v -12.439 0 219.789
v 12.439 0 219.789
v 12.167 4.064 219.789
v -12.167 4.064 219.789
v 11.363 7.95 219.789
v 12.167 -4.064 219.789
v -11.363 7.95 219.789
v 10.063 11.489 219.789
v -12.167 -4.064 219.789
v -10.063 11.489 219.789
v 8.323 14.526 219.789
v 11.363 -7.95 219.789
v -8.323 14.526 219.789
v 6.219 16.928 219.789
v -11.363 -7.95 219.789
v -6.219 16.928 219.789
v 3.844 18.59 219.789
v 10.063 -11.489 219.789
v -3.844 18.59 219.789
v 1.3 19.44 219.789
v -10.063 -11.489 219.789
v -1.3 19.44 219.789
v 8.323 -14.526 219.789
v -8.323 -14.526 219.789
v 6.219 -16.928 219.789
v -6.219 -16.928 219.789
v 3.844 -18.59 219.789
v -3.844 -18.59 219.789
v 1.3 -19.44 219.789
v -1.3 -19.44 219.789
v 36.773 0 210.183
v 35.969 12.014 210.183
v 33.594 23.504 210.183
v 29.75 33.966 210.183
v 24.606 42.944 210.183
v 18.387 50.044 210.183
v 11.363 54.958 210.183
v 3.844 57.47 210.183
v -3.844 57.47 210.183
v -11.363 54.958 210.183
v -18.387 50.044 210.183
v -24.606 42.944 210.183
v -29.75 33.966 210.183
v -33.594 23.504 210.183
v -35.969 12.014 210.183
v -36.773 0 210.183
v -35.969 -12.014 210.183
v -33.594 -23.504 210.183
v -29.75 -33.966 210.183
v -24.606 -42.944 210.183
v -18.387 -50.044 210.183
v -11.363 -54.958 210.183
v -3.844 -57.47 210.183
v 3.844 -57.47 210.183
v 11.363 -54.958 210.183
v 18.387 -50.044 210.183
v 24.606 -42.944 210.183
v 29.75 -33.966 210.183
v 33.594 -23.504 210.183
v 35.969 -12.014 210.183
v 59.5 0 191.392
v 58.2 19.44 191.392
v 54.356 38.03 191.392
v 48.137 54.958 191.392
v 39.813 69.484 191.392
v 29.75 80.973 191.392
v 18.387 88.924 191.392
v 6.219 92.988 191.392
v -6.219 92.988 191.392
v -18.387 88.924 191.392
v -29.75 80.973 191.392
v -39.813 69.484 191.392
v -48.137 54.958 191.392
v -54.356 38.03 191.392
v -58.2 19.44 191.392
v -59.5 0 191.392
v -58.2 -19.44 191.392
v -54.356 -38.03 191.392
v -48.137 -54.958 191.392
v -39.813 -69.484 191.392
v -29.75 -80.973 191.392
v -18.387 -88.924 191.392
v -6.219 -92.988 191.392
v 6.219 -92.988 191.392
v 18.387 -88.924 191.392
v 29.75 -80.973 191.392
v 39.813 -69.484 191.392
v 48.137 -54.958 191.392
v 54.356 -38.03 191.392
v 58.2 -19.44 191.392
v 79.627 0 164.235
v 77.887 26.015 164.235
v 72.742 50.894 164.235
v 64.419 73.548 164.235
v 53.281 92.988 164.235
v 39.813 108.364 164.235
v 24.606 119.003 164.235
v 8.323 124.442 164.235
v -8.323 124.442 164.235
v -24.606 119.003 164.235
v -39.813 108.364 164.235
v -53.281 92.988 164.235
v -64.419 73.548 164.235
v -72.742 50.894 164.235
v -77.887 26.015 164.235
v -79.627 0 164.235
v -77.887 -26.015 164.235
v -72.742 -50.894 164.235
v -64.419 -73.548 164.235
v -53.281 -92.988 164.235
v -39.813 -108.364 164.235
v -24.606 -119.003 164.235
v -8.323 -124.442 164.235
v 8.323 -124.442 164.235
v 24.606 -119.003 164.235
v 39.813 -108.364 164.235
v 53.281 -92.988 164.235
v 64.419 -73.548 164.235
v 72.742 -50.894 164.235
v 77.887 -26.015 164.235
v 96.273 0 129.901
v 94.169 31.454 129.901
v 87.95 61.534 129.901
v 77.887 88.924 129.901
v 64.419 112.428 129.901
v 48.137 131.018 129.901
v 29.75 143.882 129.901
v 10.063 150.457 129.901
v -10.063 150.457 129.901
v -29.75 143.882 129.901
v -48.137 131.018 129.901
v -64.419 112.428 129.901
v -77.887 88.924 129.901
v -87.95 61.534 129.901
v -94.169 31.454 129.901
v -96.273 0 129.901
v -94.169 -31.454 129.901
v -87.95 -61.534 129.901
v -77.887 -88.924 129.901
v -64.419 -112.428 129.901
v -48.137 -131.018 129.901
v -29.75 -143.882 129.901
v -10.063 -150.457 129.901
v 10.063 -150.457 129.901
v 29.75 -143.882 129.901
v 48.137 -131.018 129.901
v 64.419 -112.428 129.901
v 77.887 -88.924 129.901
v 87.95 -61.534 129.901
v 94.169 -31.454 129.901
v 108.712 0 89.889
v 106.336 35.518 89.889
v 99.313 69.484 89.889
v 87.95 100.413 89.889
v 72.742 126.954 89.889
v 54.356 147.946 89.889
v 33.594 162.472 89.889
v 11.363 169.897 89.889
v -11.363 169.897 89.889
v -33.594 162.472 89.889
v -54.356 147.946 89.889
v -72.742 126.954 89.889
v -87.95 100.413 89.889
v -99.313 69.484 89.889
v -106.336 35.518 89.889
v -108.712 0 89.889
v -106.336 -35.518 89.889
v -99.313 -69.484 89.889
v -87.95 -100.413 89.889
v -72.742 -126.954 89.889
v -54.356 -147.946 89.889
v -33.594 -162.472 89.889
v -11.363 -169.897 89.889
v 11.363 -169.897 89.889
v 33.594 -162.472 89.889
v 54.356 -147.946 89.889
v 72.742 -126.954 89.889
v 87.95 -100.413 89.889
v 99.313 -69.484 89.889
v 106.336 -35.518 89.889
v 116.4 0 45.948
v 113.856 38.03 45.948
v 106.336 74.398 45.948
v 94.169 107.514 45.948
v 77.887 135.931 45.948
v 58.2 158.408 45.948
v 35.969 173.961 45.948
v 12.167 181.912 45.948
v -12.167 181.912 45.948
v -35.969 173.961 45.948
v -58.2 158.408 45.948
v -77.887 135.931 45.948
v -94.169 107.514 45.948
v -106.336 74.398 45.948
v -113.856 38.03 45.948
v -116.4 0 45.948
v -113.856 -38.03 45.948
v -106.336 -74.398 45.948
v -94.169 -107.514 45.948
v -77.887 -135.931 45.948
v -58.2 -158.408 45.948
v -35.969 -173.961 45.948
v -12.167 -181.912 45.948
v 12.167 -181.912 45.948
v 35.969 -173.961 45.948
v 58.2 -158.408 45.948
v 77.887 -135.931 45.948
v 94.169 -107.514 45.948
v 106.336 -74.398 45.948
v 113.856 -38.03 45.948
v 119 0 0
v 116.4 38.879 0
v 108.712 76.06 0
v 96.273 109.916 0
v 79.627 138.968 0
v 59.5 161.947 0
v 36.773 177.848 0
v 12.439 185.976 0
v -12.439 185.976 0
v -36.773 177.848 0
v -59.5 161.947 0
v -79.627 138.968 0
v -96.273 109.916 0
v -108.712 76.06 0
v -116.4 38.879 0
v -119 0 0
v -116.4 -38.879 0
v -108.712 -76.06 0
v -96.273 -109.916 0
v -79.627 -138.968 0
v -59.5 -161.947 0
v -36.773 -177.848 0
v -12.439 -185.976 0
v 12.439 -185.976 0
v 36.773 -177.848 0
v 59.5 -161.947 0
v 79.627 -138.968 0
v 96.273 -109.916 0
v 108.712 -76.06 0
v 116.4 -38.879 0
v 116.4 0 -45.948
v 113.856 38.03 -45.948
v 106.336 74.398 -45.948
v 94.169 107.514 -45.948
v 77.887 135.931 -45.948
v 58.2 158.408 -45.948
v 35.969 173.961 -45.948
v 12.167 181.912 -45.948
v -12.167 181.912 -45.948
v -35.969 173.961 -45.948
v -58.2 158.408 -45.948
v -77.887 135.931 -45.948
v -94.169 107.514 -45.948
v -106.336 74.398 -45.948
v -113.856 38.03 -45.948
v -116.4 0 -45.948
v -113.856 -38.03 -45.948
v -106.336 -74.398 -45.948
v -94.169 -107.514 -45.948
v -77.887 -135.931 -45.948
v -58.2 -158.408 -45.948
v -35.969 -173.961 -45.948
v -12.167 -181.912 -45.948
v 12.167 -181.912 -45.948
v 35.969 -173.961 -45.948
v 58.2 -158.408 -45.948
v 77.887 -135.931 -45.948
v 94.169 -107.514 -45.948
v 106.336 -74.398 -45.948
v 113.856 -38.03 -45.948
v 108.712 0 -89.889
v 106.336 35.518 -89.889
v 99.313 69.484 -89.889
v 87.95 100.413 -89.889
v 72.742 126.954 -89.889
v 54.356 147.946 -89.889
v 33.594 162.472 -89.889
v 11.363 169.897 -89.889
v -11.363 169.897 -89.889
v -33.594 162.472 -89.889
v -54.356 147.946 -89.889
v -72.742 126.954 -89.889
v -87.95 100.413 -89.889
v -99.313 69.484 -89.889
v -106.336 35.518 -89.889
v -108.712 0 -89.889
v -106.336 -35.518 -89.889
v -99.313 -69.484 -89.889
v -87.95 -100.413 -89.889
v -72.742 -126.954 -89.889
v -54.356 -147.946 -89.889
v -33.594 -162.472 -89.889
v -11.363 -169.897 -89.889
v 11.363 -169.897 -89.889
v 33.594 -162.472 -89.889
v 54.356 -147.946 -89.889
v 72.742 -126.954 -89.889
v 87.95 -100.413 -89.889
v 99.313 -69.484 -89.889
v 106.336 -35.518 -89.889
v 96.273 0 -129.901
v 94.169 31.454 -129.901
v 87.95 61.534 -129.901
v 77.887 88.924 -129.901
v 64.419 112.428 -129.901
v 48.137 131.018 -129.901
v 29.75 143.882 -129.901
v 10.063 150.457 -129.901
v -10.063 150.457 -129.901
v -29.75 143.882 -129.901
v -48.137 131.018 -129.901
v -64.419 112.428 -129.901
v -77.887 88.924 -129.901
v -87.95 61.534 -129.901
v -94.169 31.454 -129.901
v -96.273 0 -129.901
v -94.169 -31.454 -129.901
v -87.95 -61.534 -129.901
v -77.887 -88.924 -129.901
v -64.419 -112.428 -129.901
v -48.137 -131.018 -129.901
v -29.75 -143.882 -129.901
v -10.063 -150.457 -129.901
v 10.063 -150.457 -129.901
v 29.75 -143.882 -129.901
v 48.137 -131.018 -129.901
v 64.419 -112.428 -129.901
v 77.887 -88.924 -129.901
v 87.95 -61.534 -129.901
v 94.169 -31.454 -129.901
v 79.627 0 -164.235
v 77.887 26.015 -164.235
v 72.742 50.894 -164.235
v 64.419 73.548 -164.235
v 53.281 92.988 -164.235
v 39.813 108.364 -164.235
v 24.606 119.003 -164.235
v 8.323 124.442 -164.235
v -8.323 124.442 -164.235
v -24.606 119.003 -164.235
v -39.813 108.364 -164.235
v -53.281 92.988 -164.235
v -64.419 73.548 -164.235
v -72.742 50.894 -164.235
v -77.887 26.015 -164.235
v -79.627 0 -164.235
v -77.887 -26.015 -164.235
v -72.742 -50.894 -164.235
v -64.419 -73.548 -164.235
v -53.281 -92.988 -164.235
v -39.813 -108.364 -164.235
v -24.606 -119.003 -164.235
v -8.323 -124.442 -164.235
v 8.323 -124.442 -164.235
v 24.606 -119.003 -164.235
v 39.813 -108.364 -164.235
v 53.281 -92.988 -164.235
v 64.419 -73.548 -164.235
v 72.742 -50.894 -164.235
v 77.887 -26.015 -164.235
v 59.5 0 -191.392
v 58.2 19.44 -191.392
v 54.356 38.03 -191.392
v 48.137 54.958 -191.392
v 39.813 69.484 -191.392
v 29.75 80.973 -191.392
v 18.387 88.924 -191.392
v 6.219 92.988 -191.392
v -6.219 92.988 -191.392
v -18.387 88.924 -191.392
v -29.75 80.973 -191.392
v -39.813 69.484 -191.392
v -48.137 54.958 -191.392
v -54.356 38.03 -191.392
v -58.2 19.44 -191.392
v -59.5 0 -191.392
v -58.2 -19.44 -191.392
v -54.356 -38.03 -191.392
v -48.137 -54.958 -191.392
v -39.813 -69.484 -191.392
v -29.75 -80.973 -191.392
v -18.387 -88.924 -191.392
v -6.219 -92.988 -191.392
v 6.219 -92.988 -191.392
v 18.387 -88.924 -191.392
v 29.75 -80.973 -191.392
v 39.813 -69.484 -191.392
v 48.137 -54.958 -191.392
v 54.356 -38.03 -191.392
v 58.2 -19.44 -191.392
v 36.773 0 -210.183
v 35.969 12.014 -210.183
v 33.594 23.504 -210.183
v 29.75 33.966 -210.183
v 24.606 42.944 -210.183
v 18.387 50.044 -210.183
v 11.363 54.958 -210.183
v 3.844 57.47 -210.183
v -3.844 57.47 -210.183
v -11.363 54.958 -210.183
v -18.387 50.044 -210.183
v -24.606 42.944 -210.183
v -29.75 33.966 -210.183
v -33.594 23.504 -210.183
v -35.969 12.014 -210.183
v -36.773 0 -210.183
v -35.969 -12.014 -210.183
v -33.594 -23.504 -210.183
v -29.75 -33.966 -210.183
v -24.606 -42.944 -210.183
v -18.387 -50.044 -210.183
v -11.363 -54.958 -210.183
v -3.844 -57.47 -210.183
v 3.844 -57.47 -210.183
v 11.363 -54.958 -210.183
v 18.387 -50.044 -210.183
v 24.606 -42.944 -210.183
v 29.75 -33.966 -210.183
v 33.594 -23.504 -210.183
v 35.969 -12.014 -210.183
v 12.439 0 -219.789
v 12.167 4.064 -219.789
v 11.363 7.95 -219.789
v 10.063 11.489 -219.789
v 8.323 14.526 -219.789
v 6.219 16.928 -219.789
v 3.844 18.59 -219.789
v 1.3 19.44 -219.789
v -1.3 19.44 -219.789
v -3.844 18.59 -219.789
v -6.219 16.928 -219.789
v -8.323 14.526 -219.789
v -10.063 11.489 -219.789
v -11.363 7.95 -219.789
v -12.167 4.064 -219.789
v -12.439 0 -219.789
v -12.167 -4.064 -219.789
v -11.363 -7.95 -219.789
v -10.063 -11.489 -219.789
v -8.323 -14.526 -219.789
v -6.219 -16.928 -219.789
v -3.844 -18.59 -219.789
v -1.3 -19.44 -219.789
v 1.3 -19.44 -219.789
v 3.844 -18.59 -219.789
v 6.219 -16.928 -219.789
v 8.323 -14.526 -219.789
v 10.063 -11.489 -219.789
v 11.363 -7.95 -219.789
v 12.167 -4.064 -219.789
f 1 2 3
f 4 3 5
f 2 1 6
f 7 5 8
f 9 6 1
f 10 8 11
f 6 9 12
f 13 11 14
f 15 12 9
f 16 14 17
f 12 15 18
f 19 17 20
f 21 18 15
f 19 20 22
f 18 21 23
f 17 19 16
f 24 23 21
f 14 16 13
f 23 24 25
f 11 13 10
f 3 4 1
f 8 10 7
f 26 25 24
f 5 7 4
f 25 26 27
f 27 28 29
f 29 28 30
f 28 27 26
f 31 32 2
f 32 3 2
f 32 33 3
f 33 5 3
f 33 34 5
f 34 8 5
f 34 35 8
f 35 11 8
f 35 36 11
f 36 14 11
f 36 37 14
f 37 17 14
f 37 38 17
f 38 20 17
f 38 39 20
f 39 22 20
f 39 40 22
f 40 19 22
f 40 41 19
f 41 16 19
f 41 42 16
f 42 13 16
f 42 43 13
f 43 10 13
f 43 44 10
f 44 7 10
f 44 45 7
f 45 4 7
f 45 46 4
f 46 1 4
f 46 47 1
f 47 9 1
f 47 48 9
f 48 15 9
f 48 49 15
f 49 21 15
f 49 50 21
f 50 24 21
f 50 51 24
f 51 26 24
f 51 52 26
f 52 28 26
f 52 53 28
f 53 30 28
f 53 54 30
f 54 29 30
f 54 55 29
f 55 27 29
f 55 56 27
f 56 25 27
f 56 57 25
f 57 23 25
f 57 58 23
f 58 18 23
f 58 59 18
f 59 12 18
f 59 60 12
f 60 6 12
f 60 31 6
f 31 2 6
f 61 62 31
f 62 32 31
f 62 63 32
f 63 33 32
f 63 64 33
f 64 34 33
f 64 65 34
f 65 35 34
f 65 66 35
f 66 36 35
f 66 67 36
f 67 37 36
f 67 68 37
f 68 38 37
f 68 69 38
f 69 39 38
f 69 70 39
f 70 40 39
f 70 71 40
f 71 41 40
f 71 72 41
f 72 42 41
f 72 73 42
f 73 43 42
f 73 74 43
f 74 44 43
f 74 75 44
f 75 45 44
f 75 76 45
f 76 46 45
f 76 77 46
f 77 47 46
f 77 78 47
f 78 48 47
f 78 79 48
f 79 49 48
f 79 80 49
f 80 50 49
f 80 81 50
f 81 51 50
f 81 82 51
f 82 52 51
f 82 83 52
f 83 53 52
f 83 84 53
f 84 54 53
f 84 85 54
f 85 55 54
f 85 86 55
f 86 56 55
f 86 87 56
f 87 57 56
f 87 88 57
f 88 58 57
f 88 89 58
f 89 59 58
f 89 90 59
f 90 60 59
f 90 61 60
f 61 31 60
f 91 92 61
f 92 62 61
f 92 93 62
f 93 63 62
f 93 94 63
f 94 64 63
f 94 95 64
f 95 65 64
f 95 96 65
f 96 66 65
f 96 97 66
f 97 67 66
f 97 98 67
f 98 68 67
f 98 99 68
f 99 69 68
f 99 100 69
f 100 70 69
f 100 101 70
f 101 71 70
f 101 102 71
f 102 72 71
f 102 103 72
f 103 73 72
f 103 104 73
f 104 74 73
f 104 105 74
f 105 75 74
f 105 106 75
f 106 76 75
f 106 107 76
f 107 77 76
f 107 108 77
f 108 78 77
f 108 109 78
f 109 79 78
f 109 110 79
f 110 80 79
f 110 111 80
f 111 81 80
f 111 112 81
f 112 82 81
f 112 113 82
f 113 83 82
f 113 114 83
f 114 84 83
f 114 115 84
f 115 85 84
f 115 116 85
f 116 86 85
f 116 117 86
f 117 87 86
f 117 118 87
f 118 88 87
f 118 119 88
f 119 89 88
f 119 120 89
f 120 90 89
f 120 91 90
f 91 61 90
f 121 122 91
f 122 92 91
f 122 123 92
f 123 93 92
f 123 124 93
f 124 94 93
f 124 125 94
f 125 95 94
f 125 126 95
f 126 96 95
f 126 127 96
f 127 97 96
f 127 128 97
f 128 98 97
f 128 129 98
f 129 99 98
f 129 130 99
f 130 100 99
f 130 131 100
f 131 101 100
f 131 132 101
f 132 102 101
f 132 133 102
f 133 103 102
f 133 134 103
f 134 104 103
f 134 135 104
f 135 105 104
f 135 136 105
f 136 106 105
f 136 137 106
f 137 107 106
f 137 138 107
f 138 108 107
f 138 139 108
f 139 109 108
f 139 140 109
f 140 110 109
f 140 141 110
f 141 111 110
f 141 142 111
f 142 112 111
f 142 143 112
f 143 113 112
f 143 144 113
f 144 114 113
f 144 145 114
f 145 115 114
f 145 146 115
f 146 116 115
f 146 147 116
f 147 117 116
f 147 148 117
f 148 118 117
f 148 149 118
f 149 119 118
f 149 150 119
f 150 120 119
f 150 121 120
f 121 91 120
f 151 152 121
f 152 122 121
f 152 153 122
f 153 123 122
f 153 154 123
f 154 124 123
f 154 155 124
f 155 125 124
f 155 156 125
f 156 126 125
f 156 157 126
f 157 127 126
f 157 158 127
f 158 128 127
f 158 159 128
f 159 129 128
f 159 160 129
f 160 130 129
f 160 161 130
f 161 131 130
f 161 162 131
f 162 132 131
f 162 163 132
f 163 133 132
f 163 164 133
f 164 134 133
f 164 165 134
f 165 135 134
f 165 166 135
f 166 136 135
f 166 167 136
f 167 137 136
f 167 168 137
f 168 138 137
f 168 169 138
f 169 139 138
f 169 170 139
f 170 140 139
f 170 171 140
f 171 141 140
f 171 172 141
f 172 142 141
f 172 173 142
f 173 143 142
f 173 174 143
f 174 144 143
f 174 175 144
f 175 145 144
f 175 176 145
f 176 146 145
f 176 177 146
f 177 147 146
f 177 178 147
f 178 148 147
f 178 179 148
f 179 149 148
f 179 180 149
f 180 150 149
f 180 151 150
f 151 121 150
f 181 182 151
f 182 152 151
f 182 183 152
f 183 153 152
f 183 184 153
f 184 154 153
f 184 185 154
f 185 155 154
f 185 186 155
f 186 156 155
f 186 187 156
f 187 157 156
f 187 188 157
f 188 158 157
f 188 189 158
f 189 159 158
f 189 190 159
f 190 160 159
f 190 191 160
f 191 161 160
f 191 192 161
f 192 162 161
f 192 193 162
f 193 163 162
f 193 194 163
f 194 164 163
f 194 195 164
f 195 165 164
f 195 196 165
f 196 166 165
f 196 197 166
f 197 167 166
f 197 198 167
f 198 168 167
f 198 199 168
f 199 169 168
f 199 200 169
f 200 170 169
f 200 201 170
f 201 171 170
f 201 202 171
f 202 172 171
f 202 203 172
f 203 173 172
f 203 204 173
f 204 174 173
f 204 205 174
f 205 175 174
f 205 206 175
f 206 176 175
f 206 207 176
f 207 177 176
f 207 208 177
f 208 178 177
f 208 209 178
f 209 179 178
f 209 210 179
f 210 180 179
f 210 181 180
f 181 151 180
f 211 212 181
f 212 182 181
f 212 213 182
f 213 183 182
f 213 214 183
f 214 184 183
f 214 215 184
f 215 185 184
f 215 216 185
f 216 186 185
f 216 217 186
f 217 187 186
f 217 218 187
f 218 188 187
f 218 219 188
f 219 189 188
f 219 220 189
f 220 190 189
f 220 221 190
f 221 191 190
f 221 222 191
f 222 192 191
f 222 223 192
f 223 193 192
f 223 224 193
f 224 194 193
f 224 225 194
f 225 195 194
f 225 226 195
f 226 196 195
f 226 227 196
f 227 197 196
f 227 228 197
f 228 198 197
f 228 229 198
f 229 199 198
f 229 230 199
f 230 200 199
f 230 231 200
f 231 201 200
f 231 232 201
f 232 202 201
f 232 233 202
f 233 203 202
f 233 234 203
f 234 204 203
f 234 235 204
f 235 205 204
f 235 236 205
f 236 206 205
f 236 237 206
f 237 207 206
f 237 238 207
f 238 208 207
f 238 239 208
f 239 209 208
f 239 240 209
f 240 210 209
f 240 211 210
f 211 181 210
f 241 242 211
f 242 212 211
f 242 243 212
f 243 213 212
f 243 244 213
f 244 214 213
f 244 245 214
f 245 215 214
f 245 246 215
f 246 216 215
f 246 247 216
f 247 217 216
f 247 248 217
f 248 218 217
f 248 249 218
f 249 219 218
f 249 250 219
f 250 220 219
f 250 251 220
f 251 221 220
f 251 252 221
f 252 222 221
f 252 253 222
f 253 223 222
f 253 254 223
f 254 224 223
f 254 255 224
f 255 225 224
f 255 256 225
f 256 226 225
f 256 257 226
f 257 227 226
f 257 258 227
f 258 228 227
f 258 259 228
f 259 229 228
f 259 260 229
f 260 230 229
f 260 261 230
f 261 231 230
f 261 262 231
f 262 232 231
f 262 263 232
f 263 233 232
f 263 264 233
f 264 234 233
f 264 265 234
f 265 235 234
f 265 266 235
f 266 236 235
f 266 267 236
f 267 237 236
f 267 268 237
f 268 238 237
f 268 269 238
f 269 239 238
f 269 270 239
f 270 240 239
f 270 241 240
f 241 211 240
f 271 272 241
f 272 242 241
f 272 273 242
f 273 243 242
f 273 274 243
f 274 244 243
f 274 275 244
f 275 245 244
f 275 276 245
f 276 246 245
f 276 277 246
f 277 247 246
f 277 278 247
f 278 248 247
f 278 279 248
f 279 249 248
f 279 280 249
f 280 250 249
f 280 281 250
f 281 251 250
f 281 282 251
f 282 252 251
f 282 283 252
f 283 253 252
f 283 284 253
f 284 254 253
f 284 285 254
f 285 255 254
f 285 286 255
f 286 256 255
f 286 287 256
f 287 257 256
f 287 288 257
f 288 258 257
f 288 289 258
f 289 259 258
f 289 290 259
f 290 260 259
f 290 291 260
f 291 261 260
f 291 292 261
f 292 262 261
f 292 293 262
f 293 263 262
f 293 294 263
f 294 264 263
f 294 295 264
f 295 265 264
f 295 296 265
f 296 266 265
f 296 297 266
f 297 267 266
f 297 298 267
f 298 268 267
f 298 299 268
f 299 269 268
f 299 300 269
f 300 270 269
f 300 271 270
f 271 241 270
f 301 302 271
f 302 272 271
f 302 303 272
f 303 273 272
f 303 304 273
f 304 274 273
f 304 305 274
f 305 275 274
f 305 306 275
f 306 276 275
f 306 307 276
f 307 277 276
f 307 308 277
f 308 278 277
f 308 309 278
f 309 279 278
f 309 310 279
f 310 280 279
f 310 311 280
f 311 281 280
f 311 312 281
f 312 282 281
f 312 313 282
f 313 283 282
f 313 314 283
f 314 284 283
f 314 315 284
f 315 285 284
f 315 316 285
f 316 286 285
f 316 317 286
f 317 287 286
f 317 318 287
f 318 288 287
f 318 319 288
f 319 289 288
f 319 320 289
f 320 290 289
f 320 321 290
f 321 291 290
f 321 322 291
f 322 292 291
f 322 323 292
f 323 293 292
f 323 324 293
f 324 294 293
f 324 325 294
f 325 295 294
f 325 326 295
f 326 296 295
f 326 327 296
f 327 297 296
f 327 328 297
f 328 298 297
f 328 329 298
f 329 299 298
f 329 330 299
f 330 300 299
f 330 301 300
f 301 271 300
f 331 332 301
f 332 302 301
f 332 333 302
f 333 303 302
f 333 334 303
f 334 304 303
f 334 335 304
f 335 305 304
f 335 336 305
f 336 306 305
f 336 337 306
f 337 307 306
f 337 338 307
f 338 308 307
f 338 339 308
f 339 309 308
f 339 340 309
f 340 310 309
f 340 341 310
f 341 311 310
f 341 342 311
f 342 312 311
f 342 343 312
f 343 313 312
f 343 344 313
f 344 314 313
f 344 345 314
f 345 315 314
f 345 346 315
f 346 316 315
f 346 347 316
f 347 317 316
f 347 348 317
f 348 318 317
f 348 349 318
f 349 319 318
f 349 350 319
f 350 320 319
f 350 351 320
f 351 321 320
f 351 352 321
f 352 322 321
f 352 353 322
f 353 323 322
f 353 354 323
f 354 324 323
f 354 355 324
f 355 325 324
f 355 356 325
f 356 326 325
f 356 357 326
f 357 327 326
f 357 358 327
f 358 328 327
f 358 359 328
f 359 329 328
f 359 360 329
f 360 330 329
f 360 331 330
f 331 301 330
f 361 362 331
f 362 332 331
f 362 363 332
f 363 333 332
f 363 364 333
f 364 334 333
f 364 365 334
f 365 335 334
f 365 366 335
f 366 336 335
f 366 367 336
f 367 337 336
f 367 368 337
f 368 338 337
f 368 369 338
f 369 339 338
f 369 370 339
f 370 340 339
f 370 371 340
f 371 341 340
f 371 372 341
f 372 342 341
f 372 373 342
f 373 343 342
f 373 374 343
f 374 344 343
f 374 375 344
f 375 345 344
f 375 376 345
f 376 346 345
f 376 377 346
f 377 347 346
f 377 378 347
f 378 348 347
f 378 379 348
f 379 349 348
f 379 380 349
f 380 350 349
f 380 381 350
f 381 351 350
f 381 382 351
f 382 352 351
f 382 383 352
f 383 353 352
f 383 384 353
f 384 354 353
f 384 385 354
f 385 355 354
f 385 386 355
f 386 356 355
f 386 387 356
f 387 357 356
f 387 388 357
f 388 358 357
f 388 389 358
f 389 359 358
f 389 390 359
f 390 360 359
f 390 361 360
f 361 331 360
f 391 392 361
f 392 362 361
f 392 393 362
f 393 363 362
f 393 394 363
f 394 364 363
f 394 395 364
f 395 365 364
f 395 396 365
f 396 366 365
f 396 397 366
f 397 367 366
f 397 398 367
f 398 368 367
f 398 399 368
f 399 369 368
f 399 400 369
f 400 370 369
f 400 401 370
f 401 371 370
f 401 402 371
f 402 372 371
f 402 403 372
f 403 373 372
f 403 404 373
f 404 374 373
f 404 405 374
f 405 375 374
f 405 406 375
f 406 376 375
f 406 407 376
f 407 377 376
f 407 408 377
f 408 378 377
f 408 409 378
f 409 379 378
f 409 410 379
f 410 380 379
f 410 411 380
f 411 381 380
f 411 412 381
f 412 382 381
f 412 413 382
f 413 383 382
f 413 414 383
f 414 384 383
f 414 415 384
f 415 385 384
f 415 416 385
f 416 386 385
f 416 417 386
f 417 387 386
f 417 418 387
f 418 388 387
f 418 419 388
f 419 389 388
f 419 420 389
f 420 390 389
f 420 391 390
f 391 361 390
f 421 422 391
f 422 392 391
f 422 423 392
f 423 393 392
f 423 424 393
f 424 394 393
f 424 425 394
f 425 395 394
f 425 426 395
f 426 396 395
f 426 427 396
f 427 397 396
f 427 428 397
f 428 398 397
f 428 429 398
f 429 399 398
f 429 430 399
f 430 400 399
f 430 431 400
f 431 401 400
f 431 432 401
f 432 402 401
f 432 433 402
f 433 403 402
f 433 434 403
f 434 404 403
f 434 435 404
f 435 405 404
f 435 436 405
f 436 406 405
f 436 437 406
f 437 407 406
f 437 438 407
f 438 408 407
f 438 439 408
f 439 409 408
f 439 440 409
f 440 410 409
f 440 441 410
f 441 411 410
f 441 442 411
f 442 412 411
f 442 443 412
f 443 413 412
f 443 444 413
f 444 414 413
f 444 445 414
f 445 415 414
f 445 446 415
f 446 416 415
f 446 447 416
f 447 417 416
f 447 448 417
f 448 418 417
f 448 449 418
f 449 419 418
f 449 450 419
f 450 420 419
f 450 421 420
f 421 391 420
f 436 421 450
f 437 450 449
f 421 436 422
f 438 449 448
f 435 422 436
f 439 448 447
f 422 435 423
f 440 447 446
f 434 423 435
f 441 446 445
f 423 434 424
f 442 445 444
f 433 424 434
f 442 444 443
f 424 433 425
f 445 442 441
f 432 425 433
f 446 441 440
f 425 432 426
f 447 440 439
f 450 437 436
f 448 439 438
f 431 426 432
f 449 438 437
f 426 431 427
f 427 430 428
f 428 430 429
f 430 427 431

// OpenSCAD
// Generated by SolidPython 1.0.1 on 2020-07-29 00:39:26


scale(v = [7, 11, 13]) {
	sphere(r = 17);
}
/***********************************************
*********      SolidPython code:      **********
************************************************
 
# import packages: SolidPython
from solid import *
from solid.utils import *
from itertools import chain, combinations


class Resize:

    def __init__(self, scad_file):
        self.scad_file = scad_file
        #self.scad_file = import_scad(scad_file)
        # cone/cylinder param:
        self.r1 = 0
        self.r2 = 0
        self.h = 0
        # rectangular prism param:
        self.w = 0
        self.l = 0
        # ellipse param:
        self.r = 0

    # import OpenScad code (file name corresponds to shape)


    # classify shape + parameters
    def assign(self, param1, param2, param3):
        if self.scad_file == 'cone.scad':
            self.r1 = param1
            self.r2 = param2
            self.h = param3
        elif self.scad_file == 'cylinder.scad':
            self.r1 = param1
            self.r2 = param2
            self.h = param3
        elif self.scad_file == 'rectangularPrism.scad':
            self.h = param1
            self.l = param2
            self.w = param3
        else:
            self.r = param1
            self.h = param2

    # resize parameters
    def iterate(self):
        x = range(3, 20, 2)
        i = 1
        if self.scad_file == 'cone.scad':
            tempList = list(combinations(x, 2))
            for temp in tempList:
                param1 = temp[0]
                param2 = temp[1]
                filepath = 'produced_scad_files/' + 'cone' + str(param1) + '_' + str(param2) + '_' + '.scad'
                scad_render_to_file(cylinder(h=param1, r1=param2, r2=0), filepath)

        elif self.scad_file == 'cylinder.scad':
            tempList = list(combinations(x, 3))
            for temp in tempList:
                param1 = temp[0]
                param2 = temp[1]
                filepath = 'produced_scad_files/' + 'cylinder' + str(param1) + '_' + str(param2) + '_' + '.scad'
                scad_render_to_file(cylinder(h=param1, r1=param2, r2=param2), filepath)

        elif self.scad_file == 'rectangularPrism.scad':
            tempList = list(combinations(x, 3))
            for temp in tempList:
                param1 = temp[0]
                param2 = temp[1]
                param3 = temp[2]
                filepath = 'produced_scad_files/' + 'rectangularPrism' + str(param1) + '_' + str(param2) + '_' + str(
                    param3) + '.scad'
                scad_render_to_file(cube(size=(param1, param2, param3)), filepath)

        elif self.scad_file == 'ellipse.scad':
            tempList = list(combinations(x, 4))
            for temp in tempList:
                param1 = temp[0]
                param2 = temp[1]
                param3 = temp[2]
                param4 = temp[3]
                filepath = 'produced_scad_files/' + 'ellipse' + str(param1) + '_' + str(param2) + '_' + str(param3) + '_' + str(param4) + '.scad'
                scad_render_to_file(scale([param1, param2, param3])(sphere(r=param4)), filepath)

    def render_to_scadfile(self):
        scad_render_to_file(scad, 'example.scad') 
 
************************************************/
